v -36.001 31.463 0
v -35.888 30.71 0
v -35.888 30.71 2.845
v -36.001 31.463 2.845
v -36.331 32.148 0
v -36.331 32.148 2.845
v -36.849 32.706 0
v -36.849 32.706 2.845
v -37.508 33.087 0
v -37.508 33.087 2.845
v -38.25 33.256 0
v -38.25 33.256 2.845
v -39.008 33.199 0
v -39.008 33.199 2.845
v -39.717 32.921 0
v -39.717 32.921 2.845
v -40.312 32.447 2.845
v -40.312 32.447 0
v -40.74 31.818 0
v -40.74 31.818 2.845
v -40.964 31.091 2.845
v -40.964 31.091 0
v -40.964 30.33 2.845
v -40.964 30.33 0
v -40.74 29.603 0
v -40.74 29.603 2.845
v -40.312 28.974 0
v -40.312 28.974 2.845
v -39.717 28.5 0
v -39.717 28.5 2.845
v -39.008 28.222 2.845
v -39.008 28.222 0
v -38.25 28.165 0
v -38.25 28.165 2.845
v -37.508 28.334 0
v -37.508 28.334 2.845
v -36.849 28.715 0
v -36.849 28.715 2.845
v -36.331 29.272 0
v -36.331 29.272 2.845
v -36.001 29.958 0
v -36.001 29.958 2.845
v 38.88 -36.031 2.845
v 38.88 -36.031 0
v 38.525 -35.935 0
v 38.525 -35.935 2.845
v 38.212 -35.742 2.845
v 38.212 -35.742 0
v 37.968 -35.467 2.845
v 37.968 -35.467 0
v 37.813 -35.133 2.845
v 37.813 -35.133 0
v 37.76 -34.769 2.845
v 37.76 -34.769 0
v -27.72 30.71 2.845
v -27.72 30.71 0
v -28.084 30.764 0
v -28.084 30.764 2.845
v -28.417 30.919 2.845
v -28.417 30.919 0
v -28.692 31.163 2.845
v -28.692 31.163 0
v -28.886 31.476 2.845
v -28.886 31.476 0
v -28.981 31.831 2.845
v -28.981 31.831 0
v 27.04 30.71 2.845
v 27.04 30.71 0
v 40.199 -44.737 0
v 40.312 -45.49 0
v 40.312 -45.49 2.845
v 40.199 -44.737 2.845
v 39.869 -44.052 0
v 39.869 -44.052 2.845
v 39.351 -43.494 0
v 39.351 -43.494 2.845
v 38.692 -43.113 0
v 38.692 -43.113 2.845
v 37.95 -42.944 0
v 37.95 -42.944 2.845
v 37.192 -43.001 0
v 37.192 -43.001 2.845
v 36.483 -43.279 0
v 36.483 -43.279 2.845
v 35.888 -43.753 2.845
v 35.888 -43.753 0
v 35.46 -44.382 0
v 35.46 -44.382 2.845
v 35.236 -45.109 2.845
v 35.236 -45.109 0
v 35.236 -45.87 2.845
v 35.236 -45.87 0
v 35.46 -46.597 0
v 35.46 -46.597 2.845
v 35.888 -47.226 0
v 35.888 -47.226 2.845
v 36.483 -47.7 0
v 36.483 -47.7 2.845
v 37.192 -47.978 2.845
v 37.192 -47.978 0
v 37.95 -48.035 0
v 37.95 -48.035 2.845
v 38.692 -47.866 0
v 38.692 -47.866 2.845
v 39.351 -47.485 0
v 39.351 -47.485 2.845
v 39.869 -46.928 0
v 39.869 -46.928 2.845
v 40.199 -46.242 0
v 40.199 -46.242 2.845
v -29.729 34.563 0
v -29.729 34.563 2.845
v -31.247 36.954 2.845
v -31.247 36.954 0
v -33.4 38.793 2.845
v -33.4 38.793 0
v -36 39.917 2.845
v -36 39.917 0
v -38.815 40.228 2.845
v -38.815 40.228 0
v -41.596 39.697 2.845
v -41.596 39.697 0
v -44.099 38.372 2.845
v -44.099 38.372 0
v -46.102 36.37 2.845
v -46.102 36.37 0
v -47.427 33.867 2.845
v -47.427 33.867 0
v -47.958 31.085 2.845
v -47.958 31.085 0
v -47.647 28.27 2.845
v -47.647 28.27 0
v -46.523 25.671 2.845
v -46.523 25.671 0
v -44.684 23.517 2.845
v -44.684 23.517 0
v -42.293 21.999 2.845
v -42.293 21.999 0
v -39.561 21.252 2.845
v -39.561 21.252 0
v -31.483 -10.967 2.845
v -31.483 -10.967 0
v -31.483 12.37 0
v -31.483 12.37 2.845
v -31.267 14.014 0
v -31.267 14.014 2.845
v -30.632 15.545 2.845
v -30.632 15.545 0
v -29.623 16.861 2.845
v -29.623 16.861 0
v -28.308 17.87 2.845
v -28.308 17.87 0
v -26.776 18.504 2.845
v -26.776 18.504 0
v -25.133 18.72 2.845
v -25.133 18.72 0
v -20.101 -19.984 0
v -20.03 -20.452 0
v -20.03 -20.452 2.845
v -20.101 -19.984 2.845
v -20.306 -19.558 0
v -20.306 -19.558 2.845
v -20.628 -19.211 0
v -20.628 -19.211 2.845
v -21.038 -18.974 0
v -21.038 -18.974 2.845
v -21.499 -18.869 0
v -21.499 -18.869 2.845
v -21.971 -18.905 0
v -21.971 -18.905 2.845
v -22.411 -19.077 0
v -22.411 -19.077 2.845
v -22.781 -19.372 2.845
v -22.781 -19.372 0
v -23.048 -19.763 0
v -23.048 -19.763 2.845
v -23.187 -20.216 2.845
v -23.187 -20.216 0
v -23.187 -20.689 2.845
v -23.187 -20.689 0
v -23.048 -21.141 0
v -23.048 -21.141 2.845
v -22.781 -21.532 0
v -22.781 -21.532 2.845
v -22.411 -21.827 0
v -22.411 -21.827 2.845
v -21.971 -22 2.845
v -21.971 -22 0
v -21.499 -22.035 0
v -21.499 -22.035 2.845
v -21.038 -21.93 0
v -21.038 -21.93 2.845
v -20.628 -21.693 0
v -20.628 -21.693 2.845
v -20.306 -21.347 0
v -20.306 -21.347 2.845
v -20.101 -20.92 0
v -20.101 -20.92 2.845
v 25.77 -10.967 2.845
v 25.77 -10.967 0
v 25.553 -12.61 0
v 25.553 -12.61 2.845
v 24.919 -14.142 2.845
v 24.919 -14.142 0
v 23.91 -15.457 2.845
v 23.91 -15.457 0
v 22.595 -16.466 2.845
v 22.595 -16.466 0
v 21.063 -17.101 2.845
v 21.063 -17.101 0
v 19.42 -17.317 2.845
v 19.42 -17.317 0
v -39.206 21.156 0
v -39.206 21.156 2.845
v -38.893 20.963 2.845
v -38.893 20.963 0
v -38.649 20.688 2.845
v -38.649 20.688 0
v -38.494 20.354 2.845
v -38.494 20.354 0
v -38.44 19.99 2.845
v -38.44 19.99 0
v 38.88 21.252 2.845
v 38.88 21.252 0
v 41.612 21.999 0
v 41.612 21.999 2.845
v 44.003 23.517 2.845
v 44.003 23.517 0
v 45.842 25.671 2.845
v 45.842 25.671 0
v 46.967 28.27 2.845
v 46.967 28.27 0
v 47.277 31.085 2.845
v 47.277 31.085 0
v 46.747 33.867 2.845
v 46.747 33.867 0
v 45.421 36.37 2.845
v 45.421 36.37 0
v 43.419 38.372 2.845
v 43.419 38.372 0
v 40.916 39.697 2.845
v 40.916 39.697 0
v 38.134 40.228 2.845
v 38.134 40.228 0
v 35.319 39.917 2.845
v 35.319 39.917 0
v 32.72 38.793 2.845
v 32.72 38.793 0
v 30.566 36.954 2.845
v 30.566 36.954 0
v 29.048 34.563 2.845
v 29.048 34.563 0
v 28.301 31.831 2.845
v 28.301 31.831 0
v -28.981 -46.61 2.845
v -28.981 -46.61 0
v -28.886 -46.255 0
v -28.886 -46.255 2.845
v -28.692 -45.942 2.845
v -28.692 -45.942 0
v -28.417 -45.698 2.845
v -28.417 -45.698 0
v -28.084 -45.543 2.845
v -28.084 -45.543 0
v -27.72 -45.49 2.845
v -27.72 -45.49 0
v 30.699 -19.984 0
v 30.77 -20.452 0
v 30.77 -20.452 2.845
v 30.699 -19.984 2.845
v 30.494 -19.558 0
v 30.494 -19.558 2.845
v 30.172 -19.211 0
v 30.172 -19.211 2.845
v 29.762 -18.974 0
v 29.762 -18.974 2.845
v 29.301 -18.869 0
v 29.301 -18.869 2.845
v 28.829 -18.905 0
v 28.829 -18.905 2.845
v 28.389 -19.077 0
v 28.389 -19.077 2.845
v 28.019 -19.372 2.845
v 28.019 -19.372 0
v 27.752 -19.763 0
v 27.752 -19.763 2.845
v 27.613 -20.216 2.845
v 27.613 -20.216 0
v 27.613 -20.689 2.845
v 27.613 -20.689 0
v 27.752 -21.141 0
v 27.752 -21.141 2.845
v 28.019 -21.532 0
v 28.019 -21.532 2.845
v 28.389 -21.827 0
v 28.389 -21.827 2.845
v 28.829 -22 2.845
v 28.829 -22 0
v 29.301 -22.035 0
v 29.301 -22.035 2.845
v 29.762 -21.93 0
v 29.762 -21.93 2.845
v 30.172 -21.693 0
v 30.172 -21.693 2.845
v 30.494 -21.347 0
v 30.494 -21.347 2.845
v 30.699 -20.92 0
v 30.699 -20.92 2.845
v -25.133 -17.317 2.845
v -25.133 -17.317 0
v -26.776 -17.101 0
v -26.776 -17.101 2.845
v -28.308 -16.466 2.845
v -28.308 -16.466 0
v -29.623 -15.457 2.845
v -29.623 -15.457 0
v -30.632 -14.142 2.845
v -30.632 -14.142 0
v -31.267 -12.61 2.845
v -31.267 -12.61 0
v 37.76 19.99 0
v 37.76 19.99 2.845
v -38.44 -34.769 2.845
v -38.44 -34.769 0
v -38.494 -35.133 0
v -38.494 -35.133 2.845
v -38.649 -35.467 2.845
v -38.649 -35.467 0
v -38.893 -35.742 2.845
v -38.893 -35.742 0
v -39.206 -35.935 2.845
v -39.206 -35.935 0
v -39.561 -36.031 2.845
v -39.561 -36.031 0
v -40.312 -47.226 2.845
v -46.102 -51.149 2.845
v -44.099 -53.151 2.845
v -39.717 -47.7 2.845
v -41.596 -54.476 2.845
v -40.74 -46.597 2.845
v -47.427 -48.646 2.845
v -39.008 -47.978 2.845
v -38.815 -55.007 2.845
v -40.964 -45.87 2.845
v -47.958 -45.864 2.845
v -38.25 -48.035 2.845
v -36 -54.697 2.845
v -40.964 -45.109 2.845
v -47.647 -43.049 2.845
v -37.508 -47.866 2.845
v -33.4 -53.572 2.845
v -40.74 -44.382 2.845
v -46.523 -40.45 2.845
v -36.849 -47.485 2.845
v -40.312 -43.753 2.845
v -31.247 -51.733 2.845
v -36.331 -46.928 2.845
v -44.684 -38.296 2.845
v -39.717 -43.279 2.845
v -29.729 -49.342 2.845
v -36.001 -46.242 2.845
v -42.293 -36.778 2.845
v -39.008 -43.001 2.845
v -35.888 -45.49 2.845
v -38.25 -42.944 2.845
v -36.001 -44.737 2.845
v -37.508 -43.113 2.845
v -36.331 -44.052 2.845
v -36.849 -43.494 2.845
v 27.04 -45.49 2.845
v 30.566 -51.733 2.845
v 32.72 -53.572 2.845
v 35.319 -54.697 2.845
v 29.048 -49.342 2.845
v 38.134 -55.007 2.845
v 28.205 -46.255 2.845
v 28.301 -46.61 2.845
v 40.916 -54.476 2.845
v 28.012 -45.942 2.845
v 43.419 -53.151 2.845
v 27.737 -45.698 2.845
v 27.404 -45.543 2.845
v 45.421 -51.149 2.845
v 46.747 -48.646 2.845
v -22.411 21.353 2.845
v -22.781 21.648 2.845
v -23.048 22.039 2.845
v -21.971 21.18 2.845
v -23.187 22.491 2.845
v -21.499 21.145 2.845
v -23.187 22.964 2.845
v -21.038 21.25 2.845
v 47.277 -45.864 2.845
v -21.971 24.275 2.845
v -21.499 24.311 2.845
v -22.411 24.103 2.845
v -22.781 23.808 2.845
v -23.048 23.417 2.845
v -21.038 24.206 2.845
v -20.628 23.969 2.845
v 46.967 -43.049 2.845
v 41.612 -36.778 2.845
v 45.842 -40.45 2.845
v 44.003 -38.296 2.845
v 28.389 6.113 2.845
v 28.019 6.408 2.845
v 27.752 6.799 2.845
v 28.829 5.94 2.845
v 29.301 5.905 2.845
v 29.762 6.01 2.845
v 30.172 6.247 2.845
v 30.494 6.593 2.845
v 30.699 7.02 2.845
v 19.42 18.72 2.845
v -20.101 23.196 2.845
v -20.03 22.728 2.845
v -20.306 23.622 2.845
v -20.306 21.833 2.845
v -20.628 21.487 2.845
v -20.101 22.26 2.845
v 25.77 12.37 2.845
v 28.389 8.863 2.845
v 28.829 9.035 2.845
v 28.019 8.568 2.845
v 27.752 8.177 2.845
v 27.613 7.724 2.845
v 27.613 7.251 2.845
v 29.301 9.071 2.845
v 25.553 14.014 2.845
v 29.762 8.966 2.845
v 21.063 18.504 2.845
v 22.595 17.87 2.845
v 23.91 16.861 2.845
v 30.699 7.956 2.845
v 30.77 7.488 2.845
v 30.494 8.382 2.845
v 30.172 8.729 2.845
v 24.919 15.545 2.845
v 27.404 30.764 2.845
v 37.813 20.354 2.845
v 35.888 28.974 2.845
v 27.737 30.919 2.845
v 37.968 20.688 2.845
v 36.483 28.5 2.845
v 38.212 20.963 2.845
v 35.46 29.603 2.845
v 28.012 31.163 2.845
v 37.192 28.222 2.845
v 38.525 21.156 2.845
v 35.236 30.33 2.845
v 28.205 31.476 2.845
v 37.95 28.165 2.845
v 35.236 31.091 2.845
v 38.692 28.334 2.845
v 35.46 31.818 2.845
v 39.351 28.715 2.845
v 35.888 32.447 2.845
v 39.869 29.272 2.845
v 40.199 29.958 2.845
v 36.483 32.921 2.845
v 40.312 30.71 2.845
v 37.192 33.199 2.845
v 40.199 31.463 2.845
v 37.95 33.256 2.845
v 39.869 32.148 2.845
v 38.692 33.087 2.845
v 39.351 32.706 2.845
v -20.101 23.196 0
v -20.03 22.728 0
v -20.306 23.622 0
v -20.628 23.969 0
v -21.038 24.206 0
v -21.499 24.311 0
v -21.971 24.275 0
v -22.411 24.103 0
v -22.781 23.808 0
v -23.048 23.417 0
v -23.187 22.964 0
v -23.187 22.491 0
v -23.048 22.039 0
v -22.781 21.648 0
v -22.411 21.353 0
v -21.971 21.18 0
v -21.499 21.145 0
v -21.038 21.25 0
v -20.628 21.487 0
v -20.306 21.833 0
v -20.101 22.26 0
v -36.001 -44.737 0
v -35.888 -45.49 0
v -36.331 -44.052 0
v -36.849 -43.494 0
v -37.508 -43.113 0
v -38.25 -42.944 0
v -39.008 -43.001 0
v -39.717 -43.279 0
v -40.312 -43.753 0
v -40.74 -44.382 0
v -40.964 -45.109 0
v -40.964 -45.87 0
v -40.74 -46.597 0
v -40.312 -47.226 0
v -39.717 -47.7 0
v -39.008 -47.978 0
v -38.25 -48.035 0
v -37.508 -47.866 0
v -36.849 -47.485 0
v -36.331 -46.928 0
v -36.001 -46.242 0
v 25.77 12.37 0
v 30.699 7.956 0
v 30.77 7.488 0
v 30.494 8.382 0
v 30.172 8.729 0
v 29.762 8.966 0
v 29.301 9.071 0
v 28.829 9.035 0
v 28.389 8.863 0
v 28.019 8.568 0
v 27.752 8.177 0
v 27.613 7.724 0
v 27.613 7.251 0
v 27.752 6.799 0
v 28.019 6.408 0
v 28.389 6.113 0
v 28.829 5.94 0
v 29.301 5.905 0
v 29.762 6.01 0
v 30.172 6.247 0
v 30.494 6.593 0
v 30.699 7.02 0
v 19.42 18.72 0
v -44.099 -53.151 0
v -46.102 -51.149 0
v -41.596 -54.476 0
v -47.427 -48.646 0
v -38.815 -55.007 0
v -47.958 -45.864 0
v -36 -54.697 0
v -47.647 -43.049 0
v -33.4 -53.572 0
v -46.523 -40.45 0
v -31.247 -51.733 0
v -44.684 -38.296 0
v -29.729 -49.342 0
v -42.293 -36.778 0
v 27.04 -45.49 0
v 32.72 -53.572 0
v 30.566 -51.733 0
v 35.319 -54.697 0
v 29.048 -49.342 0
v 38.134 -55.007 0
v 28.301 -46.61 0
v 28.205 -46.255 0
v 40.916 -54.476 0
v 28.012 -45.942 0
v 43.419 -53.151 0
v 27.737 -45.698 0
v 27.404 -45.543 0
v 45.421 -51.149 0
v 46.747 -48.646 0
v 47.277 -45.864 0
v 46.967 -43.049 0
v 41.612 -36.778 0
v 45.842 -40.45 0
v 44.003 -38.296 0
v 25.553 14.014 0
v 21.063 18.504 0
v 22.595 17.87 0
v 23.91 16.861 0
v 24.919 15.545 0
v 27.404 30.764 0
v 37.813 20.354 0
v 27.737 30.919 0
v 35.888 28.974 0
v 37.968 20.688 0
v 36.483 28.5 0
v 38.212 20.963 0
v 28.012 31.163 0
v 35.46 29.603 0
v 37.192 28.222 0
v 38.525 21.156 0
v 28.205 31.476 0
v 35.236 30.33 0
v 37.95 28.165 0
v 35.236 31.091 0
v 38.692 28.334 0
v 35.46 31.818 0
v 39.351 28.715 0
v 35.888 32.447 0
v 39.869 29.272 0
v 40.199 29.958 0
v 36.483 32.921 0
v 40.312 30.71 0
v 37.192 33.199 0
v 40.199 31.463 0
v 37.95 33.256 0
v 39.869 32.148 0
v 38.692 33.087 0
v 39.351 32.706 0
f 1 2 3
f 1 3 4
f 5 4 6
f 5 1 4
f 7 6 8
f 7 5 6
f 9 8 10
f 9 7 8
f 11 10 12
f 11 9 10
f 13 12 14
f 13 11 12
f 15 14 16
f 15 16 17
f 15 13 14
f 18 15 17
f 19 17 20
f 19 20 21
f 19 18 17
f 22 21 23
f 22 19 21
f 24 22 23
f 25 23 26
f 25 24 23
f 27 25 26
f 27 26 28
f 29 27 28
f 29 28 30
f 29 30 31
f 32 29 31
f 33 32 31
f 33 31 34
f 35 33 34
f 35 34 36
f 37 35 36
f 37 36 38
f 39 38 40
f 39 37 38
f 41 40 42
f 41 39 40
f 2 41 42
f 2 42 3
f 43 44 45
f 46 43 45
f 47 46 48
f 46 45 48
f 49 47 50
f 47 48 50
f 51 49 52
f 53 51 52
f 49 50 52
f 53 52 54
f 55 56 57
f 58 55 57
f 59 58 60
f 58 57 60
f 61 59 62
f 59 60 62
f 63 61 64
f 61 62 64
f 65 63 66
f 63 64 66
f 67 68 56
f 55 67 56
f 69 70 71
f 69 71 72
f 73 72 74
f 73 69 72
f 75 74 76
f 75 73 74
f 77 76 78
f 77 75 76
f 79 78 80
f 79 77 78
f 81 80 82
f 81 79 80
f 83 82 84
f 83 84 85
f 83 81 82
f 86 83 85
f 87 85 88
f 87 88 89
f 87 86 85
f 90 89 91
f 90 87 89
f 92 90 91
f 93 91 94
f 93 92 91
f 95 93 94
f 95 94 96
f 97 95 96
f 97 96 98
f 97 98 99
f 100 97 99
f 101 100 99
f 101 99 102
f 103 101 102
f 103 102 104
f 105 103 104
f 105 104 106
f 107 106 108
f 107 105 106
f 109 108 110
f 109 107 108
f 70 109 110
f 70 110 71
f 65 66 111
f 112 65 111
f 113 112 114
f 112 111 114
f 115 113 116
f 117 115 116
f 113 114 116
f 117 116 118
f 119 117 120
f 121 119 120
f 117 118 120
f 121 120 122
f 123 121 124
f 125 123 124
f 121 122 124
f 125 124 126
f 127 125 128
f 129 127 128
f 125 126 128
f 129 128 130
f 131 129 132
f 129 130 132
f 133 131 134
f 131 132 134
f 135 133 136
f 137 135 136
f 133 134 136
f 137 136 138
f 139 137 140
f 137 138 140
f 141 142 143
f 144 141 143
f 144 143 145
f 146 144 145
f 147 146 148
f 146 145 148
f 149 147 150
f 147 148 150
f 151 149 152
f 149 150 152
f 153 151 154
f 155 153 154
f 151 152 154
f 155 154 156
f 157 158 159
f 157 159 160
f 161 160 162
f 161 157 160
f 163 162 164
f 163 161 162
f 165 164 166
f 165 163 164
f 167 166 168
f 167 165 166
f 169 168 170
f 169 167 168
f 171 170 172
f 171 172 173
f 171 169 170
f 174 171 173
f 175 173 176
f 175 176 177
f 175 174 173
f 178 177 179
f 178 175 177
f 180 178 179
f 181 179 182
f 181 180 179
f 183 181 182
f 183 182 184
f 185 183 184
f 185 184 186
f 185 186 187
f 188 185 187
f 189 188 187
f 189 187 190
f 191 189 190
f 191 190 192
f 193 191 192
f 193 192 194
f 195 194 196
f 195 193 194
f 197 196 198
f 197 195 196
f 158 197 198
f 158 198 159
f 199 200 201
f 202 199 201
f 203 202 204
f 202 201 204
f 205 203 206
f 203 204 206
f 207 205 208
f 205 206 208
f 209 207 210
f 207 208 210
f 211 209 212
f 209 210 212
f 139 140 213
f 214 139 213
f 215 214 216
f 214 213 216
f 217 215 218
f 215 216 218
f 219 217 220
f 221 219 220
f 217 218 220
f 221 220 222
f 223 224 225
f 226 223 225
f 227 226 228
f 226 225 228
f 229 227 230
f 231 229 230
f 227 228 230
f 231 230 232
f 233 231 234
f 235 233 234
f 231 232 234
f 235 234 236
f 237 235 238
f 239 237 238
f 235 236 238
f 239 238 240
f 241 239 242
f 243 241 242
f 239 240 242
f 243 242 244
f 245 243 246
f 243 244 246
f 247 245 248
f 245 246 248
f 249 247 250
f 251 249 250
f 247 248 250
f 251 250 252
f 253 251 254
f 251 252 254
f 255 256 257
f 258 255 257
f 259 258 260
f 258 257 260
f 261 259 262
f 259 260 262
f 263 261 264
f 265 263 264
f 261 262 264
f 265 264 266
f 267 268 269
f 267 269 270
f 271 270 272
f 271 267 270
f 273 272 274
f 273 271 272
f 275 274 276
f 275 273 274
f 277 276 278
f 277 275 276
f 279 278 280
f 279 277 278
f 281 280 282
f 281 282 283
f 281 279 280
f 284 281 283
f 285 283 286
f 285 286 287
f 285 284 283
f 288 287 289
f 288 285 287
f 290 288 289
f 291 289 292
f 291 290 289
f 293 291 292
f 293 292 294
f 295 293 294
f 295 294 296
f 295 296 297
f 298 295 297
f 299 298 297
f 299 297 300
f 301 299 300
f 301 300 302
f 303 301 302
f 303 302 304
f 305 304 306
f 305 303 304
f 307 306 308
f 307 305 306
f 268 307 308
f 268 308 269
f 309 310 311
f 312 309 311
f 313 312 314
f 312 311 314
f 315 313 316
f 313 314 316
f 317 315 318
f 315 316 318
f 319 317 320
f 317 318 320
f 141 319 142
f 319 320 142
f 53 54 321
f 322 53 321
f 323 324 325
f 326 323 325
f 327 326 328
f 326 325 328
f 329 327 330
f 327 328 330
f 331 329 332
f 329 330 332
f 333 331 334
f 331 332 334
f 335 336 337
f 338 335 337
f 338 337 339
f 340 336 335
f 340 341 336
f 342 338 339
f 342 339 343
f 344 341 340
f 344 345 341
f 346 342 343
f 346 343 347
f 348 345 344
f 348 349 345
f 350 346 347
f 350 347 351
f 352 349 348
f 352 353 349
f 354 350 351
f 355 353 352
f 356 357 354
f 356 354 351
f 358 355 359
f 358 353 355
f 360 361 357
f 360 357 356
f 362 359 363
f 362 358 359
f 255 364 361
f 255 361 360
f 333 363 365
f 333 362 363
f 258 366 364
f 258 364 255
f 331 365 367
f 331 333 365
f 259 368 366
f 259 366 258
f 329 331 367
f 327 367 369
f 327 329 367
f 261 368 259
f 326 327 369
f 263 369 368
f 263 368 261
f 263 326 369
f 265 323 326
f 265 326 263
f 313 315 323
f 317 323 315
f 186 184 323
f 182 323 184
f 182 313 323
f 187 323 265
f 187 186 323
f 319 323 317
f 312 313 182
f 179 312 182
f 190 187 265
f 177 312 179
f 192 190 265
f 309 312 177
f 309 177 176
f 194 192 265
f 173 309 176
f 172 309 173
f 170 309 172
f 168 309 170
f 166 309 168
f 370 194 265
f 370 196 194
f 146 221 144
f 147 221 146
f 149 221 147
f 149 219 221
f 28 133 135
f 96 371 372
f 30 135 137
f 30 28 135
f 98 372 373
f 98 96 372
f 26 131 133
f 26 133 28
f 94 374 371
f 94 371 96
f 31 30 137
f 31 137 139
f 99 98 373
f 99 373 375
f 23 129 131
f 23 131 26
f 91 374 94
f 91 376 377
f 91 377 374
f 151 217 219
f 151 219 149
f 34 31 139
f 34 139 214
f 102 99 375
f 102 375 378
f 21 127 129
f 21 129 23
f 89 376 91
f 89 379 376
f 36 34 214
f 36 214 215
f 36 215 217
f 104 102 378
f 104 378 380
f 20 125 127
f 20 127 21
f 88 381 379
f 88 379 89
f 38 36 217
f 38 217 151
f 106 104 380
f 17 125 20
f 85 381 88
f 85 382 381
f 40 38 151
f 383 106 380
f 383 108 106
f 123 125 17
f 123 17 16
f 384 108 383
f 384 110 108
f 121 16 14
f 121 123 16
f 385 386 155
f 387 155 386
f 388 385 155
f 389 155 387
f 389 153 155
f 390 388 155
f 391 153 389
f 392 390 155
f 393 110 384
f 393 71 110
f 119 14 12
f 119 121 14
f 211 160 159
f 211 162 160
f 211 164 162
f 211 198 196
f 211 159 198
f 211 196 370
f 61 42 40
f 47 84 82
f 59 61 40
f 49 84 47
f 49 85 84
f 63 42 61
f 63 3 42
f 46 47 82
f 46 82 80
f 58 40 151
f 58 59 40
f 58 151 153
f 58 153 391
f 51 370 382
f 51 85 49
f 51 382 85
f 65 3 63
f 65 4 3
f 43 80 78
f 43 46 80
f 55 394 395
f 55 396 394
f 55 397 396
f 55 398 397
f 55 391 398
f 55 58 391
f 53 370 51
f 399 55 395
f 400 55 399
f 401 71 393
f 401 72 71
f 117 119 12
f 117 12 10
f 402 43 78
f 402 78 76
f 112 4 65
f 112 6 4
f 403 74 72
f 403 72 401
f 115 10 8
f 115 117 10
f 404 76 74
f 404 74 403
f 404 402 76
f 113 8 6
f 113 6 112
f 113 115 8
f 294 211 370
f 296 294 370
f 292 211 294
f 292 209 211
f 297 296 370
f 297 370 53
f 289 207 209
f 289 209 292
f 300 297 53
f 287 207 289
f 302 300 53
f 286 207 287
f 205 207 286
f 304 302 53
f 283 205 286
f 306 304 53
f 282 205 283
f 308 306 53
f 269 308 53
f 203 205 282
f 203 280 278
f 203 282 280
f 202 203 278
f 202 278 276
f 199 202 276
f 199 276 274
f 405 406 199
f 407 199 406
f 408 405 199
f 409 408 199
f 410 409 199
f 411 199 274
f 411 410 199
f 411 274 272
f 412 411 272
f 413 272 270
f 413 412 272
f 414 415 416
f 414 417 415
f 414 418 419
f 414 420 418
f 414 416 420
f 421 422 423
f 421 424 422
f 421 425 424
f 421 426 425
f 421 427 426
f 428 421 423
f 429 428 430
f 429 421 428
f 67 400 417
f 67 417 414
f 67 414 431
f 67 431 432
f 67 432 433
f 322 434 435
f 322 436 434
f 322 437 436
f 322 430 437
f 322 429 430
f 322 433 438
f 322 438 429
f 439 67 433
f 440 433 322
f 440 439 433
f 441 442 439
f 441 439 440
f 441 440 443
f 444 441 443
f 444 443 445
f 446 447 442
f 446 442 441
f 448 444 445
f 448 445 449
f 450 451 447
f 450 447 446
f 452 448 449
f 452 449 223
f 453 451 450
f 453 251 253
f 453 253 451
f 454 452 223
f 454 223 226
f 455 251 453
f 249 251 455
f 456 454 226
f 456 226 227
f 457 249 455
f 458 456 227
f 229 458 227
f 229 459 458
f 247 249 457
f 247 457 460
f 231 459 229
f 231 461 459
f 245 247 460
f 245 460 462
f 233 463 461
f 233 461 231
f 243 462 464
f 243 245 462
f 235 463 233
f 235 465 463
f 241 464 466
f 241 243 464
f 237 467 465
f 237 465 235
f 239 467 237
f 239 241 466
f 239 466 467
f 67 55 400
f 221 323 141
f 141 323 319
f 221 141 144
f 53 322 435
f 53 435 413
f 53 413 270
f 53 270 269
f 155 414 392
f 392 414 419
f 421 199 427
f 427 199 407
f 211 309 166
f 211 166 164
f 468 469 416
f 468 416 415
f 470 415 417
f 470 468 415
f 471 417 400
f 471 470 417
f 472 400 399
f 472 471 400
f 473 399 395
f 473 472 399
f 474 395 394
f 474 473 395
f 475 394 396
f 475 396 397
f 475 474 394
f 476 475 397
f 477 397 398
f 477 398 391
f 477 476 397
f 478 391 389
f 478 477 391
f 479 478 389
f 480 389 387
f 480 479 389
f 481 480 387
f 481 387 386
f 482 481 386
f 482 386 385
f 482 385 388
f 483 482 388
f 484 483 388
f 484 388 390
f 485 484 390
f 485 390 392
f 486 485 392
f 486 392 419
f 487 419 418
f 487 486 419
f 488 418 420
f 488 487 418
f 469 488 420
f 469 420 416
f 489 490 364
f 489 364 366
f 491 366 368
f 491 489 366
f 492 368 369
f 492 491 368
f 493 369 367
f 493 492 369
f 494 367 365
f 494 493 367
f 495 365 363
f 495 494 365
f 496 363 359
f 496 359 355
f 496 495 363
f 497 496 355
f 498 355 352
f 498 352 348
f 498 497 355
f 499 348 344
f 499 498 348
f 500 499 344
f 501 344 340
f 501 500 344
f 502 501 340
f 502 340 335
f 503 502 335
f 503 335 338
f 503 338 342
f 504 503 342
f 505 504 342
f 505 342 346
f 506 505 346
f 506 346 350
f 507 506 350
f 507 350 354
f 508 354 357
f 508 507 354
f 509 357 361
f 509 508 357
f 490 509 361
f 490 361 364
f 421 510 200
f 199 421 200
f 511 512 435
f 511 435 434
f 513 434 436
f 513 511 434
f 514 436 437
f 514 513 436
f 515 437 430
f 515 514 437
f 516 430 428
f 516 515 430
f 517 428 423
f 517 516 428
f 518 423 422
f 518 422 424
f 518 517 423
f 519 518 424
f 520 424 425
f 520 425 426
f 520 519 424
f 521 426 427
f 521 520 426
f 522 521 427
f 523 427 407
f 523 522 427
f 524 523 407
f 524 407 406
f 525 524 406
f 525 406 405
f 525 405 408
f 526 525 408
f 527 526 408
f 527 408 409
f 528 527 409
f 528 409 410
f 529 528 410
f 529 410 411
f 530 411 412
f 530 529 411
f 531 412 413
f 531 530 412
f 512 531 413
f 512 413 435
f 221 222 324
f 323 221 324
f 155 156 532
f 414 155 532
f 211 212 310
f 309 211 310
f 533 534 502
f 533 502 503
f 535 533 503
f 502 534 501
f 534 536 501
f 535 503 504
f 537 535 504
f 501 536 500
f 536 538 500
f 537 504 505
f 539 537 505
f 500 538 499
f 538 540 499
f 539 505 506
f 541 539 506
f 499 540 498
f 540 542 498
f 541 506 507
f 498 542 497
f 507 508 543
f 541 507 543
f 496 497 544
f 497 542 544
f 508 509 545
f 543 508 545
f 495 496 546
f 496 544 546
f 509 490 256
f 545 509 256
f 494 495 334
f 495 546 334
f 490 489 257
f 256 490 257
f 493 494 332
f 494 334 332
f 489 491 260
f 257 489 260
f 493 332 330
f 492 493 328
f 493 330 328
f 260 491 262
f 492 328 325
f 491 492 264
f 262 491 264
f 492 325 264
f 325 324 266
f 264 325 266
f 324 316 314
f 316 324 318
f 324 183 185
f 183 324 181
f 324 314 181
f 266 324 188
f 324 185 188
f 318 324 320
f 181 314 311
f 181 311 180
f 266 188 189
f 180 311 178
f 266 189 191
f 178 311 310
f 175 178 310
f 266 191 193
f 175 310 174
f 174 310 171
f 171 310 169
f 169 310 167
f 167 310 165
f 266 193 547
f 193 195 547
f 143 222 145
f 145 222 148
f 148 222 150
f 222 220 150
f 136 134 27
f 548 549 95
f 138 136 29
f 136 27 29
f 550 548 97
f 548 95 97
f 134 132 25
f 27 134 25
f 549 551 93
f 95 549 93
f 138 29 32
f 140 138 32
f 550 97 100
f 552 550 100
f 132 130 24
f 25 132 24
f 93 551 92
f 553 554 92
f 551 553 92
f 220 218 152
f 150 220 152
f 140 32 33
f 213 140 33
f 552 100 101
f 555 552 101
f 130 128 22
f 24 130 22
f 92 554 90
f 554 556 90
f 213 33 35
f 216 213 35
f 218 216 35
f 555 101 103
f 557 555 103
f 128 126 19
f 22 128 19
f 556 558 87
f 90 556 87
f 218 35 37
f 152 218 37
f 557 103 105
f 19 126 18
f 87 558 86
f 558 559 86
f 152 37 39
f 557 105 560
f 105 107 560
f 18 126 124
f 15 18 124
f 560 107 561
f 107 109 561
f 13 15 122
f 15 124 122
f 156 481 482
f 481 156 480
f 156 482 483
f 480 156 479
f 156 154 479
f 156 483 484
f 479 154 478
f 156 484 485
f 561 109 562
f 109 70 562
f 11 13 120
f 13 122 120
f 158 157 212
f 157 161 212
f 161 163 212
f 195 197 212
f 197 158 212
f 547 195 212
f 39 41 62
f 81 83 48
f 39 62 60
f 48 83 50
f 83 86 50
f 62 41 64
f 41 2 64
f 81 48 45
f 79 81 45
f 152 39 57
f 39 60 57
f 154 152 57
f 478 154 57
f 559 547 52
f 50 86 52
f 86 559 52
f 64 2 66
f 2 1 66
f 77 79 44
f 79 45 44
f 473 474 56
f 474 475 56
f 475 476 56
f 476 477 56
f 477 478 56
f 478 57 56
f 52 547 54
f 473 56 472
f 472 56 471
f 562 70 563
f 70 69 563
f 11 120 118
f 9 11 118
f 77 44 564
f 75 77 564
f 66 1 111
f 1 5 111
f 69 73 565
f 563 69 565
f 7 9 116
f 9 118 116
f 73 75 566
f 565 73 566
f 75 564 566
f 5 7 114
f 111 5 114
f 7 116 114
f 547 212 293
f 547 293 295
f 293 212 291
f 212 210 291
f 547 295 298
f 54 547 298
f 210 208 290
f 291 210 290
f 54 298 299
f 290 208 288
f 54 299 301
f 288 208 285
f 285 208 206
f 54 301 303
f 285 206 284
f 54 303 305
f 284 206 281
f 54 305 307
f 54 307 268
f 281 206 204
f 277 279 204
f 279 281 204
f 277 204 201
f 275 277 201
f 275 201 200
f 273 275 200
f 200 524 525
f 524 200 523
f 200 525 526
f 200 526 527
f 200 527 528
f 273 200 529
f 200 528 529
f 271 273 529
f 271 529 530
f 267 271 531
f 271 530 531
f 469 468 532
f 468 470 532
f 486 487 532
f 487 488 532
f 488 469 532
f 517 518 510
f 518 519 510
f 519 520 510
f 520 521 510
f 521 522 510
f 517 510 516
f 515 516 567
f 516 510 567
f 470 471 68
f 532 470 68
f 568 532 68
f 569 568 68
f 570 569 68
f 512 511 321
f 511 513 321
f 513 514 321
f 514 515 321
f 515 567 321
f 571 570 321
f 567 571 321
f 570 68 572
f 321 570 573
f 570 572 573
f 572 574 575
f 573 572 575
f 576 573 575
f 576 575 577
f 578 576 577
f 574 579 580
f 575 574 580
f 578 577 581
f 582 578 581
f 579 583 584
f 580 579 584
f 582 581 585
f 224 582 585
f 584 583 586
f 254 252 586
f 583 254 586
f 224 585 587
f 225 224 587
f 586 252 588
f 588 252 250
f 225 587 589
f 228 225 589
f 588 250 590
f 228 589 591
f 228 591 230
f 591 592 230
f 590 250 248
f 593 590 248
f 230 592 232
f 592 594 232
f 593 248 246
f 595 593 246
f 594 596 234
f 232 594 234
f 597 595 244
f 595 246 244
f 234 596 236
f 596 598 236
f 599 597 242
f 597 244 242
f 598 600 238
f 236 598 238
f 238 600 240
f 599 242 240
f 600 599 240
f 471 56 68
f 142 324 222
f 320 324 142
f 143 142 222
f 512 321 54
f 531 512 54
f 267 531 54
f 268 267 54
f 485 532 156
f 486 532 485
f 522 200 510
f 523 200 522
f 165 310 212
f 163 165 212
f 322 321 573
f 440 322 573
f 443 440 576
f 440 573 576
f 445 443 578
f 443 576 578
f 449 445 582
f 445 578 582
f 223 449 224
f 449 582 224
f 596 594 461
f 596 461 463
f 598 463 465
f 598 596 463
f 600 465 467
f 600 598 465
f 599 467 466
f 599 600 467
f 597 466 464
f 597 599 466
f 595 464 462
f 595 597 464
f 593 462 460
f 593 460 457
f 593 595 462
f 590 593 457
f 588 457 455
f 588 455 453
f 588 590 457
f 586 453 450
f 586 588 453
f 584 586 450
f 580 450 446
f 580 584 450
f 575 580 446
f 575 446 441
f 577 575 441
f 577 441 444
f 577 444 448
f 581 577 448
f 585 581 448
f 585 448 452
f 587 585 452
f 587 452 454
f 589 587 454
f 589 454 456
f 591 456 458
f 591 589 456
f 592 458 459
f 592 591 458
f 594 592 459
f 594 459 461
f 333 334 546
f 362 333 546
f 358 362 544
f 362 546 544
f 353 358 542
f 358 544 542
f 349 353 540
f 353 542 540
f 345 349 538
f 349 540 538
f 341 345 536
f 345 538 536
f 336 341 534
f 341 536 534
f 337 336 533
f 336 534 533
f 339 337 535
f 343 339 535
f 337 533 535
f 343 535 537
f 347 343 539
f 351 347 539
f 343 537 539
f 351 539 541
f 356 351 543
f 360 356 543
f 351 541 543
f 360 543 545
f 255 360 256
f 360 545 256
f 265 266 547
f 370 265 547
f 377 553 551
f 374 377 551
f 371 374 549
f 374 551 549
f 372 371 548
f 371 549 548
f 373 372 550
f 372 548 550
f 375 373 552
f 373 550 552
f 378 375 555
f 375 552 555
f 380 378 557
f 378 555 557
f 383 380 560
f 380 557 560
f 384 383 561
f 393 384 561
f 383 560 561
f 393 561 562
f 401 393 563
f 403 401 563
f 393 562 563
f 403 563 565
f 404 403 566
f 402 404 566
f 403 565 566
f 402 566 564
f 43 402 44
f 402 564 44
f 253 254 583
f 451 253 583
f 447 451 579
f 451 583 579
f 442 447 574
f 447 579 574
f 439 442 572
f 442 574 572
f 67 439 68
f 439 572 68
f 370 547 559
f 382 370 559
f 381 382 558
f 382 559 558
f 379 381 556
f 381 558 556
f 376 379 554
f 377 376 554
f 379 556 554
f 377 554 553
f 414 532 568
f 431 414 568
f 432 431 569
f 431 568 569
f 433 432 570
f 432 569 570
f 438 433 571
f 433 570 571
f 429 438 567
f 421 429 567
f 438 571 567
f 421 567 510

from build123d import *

# Parameters (mm, degrees)
F0_R     = 2.5527
F0_R_2   = 1.5875
F1_DEPTH = 2.8448


with BuildPart() as f1:
    # F0 (on Top) → F1 (new body)
    with BuildSketch(Plane.XY):
        with BuildLine():
            Line((27.039664, 30.710469), (-27.720269, 30.710469))
            ThreePointArc((-27.720269, 30.710469), (-28.563817, 31.031086), (-28.981449, 31.831057))
            ThreePointArc((-28.981449, 31.831057), (-45.175495, 37.445661), (-39.560891, 21.251615))
            ThreePointArc((-39.560891, 21.251615), (-38.76092, 20.833983), (-38.440302, 19.990435))
            Line((-38.440302, 19.990435), (-38.440302, -34.769498))
            ThreePointArc((-38.440302, -34.769498), (-38.76092, -35.613046), (-39.560891, -36.030678))
            ThreePointArc((-39.560891, -36.030678), (-45.175495, -52.224723), (-28.981449, -46.61012))
            ThreePointArc((-28.981449, -46.61012), (-28.563817, -45.810149), (-27.720269, -45.489531))
            Line((-27.720269, -45.489531), (27.039664, -45.489531))
            ThreePointArc((27.039664, -45.489531), (27.883212, -45.810149), (28.300844, -46.61012))
            ThreePointArc((28.300844, -46.61012), (44.49489, -52.224723), (38.880286, -36.030678))
            ThreePointArc((38.880286, -36.030678), (38.080315, -35.613046), (37.759698, -34.769498))
            Line((37.759698, -34.769498), (37.759698, 19.990435))
            ThreePointArc((37.759698, 19.990435), (38.080315, 20.833983), (38.880286, 21.251615))
            ThreePointArc((38.880286, 21.251615), (44.49489, 37.445661), (28.300844, 31.831057))
            ThreePointArc((28.300844, 31.831057), (27.883212, 31.031086), (27.039664, 30.710469))
        make_face()
        with Locations((-38.440302, -45.489531)):
            Circle(F0_R, mode=Mode.SUBTRACT)
        with Locations((-21.61768, -20.452246)):
            Circle(F0_R_2, mode=Mode.SUBTRACT)
        with Locations((37.759698, -45.489531)):
            Circle(F0_R, mode=Mode.SUBTRACT)
        with Locations((29.18232, -20.452246)):
            Circle(F0_R_2, mode=Mode.SUBTRACT)
        with BuildLine():
            ThreePointArc((-31.482945, 12.370435), (-29.623073, 16.860563), (-25.132945, 18.720435))
            Line((-25.132945, 18.720435), (19.419664, 18.720435))
            ThreePointArc((19.419664, 18.720435), (23.909792, 16.860563), (25.769664, 12.370435))
            Line((25.769664, 12.370435), (25.769664, -10.966996))
            ThreePointArc((25.769664, -10.966996), (23.909792, -15.457124), (19.419664, -17.316996))
            Line((19.419664, -17.316996), (-25.132945, -17.316996))
            ThreePointArc((-25.132945, -17.316996), (-29.623073, -15.457124), (-31.482945, -10.966996))
            Line((-31.482945, -10.966996), (-31.482945, 12.370435))
        make_face(mode=Mode.SUBTRACT)
        with Locations((-38.440302, 30.710469)):
            Circle(F0_R, mode=Mode.SUBTRACT)
        with Locations((-21.61768, 22.727754)):
            Circle(F0_R_2, mode=Mode.SUBTRACT)
        with Locations((29.18232, 7.487754)):
            Circle(F0_R_2, mode=Mode.SUBTRACT)
        with Locations((37.759698, 30.710469)):
            Circle(F0_R, mode=Mode.SUBTRACT)
    extrude(amount=F1_DEPTH)


solid = f1.part
